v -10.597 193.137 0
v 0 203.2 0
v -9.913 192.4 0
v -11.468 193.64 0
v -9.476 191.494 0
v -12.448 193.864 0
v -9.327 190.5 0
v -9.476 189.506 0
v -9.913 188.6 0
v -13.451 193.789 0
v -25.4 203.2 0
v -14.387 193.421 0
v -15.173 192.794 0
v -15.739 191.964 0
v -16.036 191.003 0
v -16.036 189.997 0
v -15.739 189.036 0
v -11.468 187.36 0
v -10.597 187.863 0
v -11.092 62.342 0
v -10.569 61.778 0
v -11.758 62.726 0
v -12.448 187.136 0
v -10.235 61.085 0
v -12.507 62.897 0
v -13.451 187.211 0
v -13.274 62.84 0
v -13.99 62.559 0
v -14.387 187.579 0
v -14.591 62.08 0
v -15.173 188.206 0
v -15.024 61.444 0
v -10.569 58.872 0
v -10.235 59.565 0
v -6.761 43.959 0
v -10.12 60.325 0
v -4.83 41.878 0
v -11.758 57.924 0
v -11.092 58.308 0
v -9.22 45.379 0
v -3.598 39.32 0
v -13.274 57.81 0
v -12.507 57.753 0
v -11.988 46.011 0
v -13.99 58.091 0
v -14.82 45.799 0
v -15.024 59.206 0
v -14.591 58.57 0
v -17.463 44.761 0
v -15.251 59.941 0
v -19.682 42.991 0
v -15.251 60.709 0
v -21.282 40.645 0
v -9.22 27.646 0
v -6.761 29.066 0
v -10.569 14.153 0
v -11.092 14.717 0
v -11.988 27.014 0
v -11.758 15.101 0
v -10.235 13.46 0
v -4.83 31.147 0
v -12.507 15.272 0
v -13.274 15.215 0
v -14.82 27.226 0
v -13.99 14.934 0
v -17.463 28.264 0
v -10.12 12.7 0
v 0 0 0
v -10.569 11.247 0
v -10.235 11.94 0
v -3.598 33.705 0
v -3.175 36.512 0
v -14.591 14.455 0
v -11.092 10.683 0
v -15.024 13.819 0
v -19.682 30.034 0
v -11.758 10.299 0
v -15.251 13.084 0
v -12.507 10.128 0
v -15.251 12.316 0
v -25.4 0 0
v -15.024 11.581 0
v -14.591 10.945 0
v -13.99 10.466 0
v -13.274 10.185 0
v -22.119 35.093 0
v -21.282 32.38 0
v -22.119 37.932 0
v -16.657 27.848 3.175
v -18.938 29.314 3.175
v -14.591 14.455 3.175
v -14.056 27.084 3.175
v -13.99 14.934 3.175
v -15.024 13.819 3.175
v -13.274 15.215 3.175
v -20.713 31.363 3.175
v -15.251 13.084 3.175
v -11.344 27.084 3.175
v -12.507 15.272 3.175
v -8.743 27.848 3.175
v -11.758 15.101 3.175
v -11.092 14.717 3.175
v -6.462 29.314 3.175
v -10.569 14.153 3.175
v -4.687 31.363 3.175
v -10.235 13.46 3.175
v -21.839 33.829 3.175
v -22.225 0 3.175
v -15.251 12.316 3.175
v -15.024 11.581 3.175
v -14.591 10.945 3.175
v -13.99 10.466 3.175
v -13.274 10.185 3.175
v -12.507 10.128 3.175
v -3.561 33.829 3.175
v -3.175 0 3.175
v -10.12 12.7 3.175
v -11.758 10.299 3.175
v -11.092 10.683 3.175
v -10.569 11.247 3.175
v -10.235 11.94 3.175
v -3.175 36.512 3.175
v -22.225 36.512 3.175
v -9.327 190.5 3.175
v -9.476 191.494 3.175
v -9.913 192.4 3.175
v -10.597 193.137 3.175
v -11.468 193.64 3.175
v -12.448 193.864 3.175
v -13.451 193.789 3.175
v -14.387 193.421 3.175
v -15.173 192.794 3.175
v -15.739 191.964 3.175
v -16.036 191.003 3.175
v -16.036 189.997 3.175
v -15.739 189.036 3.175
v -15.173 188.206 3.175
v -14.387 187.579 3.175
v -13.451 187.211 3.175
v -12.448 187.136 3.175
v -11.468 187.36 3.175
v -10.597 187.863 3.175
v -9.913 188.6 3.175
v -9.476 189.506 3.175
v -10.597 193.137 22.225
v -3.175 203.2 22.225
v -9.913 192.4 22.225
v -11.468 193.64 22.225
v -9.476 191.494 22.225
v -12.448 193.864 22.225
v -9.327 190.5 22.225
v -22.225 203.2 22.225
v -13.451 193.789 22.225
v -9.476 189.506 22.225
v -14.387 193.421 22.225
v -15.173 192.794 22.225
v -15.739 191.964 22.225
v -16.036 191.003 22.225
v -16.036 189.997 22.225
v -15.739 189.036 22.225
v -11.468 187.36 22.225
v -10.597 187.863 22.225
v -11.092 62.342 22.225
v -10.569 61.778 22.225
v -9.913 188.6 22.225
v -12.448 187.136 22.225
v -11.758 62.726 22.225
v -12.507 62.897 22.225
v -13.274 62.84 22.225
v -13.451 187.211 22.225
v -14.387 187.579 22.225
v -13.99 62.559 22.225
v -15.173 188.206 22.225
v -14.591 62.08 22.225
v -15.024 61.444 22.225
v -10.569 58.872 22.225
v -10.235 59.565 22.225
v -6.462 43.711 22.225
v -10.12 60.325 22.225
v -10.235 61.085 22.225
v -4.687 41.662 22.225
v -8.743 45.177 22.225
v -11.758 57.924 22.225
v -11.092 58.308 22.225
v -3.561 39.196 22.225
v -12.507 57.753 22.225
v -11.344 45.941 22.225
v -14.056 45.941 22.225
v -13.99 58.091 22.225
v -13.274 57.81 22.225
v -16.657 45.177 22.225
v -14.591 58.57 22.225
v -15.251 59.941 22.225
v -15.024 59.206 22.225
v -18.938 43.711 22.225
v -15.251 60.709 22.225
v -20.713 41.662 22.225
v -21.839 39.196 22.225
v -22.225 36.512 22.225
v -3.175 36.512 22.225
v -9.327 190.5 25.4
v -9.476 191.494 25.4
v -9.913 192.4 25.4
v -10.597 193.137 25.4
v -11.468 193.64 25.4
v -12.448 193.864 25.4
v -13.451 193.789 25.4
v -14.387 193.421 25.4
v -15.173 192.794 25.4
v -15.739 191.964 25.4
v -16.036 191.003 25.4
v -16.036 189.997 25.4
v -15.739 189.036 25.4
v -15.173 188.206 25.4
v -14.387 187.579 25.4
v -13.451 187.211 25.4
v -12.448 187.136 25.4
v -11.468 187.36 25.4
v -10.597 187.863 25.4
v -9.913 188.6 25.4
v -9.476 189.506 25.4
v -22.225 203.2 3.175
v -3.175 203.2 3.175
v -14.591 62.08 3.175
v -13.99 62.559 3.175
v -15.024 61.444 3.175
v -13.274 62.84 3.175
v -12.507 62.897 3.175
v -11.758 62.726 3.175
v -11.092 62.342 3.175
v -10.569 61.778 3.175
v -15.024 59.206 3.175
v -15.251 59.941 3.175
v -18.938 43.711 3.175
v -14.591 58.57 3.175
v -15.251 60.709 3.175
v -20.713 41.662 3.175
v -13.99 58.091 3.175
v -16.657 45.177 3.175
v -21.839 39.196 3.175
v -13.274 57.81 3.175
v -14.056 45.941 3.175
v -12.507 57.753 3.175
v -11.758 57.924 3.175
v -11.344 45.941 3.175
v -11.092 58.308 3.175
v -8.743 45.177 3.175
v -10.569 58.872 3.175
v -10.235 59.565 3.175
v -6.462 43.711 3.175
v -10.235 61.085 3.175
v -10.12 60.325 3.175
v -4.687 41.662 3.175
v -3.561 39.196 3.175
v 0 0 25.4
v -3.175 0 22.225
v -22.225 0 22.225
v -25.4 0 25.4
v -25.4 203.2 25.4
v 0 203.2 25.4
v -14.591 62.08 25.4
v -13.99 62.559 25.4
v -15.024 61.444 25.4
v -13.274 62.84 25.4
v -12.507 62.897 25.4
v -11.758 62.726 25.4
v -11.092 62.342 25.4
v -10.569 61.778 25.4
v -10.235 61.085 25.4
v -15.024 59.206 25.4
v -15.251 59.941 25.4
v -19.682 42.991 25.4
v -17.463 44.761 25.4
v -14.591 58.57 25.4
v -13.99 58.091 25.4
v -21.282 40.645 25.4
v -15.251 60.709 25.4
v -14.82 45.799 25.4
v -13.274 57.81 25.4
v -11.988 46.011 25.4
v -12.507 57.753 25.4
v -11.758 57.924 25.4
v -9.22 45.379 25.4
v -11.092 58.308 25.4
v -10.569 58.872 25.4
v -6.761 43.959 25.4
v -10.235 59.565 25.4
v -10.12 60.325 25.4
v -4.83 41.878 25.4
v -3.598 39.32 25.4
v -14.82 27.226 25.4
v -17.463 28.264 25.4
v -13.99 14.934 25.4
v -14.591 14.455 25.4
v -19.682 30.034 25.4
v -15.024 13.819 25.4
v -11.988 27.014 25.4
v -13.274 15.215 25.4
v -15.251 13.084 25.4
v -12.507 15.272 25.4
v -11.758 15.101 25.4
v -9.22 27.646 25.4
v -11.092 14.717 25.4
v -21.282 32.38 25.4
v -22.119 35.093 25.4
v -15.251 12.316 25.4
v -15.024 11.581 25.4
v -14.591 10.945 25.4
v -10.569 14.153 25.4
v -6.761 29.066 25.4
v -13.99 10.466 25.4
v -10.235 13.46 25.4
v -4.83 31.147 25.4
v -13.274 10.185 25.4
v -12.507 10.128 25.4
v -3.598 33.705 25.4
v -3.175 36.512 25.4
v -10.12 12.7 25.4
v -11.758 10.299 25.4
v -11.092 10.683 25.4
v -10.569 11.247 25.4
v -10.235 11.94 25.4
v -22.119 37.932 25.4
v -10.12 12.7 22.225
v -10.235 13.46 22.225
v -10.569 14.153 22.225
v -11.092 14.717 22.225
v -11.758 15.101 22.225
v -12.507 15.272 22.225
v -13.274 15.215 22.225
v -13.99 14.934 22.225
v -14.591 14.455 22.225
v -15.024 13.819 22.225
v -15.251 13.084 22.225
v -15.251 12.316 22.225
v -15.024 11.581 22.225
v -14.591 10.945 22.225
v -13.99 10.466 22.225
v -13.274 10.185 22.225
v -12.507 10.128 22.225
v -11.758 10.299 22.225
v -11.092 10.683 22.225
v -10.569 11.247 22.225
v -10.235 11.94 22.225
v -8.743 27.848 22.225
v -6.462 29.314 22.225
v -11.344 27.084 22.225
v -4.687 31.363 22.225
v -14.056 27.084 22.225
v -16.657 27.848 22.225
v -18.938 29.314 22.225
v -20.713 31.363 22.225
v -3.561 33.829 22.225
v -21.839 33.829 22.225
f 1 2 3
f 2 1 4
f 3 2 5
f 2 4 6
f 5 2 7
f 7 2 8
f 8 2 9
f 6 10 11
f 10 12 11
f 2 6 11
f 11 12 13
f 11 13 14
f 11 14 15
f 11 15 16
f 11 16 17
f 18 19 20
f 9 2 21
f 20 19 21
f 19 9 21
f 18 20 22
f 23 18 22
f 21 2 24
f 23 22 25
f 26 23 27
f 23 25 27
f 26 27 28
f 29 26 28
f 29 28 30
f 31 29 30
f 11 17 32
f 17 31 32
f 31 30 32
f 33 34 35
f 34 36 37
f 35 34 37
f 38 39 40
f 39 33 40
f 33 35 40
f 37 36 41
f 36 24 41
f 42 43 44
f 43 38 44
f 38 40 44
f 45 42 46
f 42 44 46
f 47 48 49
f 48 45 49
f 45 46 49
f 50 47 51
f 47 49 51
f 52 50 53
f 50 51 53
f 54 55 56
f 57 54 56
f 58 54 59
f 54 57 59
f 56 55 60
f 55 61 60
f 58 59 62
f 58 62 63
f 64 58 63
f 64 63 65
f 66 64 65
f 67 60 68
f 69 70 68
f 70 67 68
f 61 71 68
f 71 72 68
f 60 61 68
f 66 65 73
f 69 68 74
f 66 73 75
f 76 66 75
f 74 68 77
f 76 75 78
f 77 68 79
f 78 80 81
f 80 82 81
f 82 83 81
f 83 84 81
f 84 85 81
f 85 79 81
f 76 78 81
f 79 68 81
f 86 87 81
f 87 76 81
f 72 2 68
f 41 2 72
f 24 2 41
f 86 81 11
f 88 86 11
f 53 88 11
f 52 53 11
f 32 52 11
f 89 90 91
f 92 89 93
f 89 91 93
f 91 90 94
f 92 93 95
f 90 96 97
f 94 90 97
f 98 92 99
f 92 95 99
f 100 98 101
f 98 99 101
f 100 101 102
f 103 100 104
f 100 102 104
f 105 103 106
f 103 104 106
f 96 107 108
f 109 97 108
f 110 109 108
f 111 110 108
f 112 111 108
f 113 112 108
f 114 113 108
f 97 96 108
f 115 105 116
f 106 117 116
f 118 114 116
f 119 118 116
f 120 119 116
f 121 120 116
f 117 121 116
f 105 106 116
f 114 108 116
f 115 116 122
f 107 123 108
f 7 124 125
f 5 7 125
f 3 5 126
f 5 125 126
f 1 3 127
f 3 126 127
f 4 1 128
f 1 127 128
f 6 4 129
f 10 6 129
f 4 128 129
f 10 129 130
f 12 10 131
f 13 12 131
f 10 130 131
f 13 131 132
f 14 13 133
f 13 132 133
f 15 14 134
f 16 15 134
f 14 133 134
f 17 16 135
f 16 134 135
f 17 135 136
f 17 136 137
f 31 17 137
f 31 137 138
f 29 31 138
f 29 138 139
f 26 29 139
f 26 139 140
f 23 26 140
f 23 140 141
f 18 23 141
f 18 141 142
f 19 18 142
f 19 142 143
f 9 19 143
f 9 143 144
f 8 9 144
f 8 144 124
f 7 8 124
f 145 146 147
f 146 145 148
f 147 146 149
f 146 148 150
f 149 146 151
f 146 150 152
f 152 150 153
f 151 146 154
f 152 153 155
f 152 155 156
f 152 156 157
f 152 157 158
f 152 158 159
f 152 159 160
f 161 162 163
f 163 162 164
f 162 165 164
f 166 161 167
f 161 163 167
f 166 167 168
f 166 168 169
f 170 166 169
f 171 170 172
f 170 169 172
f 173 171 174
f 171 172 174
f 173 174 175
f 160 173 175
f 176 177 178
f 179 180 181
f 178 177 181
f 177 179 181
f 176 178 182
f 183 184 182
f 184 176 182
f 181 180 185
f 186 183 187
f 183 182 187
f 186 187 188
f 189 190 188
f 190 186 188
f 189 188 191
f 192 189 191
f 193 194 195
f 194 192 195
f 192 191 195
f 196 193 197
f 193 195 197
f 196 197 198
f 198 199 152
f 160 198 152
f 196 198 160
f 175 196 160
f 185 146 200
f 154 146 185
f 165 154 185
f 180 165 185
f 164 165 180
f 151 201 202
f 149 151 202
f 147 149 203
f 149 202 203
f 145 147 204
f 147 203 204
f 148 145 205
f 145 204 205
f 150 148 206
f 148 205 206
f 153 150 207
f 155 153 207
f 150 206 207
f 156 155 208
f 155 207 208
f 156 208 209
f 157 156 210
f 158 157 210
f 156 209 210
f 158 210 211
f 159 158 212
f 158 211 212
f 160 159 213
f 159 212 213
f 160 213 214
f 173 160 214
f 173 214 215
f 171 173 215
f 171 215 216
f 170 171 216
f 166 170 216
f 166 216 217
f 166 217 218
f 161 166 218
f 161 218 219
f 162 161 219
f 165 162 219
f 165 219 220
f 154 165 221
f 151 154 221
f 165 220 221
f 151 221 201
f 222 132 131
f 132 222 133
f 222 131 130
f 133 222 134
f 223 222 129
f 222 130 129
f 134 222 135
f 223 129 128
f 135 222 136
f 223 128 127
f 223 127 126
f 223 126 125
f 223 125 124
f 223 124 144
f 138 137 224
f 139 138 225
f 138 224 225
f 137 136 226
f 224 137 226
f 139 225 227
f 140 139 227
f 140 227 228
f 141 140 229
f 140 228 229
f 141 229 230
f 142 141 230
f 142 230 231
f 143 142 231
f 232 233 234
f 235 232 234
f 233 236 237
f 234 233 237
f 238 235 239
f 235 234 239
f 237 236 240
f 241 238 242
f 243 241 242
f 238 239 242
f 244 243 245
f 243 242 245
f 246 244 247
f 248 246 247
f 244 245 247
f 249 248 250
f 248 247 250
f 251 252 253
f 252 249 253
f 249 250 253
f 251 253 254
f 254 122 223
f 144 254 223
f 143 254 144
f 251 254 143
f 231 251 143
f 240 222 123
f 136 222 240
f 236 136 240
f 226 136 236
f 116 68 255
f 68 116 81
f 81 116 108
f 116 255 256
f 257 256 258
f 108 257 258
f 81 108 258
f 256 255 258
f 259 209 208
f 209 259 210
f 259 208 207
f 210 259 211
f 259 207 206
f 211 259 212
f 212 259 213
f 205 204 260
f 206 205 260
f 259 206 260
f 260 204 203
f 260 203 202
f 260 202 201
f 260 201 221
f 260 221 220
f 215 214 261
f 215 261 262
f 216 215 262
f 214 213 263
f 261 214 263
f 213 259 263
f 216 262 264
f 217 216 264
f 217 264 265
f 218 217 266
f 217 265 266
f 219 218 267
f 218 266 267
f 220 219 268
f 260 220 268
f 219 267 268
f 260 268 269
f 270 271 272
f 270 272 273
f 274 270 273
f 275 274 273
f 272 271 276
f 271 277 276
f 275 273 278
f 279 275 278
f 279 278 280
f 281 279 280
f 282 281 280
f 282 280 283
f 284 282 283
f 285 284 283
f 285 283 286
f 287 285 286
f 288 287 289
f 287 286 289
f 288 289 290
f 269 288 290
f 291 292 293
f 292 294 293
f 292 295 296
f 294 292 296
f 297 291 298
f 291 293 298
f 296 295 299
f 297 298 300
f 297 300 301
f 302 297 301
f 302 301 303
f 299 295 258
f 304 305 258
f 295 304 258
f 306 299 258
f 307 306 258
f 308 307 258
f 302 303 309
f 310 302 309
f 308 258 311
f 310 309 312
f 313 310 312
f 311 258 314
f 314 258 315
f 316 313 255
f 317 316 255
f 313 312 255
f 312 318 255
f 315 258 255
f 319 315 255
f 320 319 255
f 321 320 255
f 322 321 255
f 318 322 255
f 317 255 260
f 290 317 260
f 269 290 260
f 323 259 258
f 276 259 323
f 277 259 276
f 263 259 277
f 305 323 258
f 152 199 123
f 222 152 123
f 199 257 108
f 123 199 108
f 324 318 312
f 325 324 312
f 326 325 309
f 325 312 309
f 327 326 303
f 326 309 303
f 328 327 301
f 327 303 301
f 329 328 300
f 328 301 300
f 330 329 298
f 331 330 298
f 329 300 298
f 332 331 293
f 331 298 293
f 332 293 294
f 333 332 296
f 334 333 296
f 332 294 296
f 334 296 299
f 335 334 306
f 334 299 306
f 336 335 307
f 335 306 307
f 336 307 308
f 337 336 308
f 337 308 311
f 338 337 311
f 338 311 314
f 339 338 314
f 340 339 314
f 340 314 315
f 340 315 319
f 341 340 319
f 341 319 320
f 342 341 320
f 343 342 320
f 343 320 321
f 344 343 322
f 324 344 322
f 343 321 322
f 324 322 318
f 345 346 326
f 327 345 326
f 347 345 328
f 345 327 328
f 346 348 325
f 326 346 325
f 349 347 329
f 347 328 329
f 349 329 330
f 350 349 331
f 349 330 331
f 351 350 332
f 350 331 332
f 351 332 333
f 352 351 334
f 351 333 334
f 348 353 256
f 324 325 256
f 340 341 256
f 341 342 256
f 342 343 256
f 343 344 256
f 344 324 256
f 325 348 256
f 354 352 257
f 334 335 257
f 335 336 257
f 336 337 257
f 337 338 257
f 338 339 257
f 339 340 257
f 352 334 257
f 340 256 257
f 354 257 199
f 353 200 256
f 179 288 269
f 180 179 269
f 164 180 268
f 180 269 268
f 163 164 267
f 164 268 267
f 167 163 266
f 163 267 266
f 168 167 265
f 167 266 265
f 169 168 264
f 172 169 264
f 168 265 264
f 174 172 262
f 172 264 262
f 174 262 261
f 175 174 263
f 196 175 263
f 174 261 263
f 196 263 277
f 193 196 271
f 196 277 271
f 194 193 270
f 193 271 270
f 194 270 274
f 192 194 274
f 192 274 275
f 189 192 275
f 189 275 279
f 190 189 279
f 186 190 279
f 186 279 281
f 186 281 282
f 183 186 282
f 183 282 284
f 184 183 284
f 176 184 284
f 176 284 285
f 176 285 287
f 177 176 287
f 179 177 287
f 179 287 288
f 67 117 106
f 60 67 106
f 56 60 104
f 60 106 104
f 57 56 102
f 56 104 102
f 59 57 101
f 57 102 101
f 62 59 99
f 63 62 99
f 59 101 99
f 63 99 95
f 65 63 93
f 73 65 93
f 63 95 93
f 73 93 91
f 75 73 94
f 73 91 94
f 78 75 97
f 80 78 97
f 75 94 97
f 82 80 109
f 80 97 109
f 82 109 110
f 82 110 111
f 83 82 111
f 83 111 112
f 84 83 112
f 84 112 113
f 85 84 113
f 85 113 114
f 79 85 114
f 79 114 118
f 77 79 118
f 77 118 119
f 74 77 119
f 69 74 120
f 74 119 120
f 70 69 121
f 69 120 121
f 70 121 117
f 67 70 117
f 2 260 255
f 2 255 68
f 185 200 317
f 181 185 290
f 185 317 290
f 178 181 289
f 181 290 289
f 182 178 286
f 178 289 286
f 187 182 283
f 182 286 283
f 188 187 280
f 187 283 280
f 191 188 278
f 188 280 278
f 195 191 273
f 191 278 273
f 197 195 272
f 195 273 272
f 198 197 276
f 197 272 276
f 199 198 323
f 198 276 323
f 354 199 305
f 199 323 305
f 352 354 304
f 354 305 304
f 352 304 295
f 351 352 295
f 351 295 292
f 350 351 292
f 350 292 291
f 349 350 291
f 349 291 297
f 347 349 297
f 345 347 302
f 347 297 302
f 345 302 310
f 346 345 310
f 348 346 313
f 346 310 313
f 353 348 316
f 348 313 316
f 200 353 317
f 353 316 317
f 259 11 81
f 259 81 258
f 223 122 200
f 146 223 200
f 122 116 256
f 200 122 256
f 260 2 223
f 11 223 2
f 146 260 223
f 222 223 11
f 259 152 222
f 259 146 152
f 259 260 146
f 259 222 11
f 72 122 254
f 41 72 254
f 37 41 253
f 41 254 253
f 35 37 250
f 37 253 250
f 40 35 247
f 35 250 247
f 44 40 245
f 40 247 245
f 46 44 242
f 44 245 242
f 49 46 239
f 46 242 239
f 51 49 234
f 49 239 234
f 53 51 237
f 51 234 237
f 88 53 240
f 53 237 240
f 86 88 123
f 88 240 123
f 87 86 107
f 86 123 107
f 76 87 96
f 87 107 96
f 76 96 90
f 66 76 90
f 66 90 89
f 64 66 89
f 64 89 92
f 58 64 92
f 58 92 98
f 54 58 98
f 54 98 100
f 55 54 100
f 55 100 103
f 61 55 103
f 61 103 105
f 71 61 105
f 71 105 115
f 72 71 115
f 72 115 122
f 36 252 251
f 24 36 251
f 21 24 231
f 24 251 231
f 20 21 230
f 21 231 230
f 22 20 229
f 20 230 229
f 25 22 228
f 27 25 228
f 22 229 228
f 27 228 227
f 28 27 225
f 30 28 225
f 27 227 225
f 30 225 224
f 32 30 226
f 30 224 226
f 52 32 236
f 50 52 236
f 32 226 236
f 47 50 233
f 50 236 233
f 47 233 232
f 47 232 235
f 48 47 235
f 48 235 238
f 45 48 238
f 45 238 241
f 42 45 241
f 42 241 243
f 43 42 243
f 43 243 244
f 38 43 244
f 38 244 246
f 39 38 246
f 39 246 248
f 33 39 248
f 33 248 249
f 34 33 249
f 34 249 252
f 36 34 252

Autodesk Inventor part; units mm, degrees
ref_plane "YZ Plane" through (0, 0, 0) normal (1, 0, 0) x (0, 1, 0)
ref_plane "XZ Plane" through (0, 0, 0) normal (0, 1, 0) x (-1, 0, 0)
ref_plane "XY Plane" through (0, 0, 0) normal (0, 0, 1) x (1, 0, 0)
sketch "Sketch1" plane through (0, 0, 0) normal (0, 1, 0) x (-1, 0, 0)
  line L0 (0, 0) -> (25.4, 0)
  line L1 (25.4, 0) -> (25.4, 25.4)
  line L2 (25.4, 25.4) -> (0, 25.4)
  line L3 (0, 25.4) -> (0, 0)
  line L4 (22.225, 22.225) -> (22.225, 3.175)
  line L5 (22.225, 3.175) -> (3.175, 3.175)
  line L6 (3.175, 3.175) -> (3.175, 22.225)
  line L7 (3.175, 22.225) -> (22.225, 22.225)
  dimension "d0" = 25.4
  dimension "d1" = 25.4
  dimension "d2" = 3.175
extrude "Extrusion1" add sketch "Sketch1" along normal blind 203.2
sketch "Sketch2" plane through (-25.4, 0, 25.4) normal (0, 0, 1) x (1, 0, 0)
  circle A0 centre (12.7, 12.7) radius 2.5797
  circle A1 centre (12.7, 60.325) radius 2.5797
  line L0 (25.4, 0) -> (25.4, 203.2) projected
  line L1 (0, 0) -> (25.4, 0) projected
  circle A2 centre (12.7, 36.5125) radius 9.525
  circle A3 centre (12.7, 190.5) radius 3.3734
  line L2 (0, 0) -> (0, 203.2) projected
  line L3 (25.4, 203.2) -> (0, 203.2) projected
  dimension "d5" = 5.1594
  dimension "d6" = 5.1594
  dimension "d7" = 47.625
  dimension "d8" = 12.7
  dimension "d9" = 12.7
  dimension "d10" = 12.7
  dimension "d13" = 19.05
  dimension "d14" = 23.8125
  dimension "d15" = 12.7
  dimension "d16" = 6.7469
  dimension "d17" = 12.7
  dimension "d18" = 12.7
extrude "Extrusion2" cut sketch "Sketch2" against normal blind 25.4 contours A0 | A1 | A2 | A3
properties part number "arm replacement"
